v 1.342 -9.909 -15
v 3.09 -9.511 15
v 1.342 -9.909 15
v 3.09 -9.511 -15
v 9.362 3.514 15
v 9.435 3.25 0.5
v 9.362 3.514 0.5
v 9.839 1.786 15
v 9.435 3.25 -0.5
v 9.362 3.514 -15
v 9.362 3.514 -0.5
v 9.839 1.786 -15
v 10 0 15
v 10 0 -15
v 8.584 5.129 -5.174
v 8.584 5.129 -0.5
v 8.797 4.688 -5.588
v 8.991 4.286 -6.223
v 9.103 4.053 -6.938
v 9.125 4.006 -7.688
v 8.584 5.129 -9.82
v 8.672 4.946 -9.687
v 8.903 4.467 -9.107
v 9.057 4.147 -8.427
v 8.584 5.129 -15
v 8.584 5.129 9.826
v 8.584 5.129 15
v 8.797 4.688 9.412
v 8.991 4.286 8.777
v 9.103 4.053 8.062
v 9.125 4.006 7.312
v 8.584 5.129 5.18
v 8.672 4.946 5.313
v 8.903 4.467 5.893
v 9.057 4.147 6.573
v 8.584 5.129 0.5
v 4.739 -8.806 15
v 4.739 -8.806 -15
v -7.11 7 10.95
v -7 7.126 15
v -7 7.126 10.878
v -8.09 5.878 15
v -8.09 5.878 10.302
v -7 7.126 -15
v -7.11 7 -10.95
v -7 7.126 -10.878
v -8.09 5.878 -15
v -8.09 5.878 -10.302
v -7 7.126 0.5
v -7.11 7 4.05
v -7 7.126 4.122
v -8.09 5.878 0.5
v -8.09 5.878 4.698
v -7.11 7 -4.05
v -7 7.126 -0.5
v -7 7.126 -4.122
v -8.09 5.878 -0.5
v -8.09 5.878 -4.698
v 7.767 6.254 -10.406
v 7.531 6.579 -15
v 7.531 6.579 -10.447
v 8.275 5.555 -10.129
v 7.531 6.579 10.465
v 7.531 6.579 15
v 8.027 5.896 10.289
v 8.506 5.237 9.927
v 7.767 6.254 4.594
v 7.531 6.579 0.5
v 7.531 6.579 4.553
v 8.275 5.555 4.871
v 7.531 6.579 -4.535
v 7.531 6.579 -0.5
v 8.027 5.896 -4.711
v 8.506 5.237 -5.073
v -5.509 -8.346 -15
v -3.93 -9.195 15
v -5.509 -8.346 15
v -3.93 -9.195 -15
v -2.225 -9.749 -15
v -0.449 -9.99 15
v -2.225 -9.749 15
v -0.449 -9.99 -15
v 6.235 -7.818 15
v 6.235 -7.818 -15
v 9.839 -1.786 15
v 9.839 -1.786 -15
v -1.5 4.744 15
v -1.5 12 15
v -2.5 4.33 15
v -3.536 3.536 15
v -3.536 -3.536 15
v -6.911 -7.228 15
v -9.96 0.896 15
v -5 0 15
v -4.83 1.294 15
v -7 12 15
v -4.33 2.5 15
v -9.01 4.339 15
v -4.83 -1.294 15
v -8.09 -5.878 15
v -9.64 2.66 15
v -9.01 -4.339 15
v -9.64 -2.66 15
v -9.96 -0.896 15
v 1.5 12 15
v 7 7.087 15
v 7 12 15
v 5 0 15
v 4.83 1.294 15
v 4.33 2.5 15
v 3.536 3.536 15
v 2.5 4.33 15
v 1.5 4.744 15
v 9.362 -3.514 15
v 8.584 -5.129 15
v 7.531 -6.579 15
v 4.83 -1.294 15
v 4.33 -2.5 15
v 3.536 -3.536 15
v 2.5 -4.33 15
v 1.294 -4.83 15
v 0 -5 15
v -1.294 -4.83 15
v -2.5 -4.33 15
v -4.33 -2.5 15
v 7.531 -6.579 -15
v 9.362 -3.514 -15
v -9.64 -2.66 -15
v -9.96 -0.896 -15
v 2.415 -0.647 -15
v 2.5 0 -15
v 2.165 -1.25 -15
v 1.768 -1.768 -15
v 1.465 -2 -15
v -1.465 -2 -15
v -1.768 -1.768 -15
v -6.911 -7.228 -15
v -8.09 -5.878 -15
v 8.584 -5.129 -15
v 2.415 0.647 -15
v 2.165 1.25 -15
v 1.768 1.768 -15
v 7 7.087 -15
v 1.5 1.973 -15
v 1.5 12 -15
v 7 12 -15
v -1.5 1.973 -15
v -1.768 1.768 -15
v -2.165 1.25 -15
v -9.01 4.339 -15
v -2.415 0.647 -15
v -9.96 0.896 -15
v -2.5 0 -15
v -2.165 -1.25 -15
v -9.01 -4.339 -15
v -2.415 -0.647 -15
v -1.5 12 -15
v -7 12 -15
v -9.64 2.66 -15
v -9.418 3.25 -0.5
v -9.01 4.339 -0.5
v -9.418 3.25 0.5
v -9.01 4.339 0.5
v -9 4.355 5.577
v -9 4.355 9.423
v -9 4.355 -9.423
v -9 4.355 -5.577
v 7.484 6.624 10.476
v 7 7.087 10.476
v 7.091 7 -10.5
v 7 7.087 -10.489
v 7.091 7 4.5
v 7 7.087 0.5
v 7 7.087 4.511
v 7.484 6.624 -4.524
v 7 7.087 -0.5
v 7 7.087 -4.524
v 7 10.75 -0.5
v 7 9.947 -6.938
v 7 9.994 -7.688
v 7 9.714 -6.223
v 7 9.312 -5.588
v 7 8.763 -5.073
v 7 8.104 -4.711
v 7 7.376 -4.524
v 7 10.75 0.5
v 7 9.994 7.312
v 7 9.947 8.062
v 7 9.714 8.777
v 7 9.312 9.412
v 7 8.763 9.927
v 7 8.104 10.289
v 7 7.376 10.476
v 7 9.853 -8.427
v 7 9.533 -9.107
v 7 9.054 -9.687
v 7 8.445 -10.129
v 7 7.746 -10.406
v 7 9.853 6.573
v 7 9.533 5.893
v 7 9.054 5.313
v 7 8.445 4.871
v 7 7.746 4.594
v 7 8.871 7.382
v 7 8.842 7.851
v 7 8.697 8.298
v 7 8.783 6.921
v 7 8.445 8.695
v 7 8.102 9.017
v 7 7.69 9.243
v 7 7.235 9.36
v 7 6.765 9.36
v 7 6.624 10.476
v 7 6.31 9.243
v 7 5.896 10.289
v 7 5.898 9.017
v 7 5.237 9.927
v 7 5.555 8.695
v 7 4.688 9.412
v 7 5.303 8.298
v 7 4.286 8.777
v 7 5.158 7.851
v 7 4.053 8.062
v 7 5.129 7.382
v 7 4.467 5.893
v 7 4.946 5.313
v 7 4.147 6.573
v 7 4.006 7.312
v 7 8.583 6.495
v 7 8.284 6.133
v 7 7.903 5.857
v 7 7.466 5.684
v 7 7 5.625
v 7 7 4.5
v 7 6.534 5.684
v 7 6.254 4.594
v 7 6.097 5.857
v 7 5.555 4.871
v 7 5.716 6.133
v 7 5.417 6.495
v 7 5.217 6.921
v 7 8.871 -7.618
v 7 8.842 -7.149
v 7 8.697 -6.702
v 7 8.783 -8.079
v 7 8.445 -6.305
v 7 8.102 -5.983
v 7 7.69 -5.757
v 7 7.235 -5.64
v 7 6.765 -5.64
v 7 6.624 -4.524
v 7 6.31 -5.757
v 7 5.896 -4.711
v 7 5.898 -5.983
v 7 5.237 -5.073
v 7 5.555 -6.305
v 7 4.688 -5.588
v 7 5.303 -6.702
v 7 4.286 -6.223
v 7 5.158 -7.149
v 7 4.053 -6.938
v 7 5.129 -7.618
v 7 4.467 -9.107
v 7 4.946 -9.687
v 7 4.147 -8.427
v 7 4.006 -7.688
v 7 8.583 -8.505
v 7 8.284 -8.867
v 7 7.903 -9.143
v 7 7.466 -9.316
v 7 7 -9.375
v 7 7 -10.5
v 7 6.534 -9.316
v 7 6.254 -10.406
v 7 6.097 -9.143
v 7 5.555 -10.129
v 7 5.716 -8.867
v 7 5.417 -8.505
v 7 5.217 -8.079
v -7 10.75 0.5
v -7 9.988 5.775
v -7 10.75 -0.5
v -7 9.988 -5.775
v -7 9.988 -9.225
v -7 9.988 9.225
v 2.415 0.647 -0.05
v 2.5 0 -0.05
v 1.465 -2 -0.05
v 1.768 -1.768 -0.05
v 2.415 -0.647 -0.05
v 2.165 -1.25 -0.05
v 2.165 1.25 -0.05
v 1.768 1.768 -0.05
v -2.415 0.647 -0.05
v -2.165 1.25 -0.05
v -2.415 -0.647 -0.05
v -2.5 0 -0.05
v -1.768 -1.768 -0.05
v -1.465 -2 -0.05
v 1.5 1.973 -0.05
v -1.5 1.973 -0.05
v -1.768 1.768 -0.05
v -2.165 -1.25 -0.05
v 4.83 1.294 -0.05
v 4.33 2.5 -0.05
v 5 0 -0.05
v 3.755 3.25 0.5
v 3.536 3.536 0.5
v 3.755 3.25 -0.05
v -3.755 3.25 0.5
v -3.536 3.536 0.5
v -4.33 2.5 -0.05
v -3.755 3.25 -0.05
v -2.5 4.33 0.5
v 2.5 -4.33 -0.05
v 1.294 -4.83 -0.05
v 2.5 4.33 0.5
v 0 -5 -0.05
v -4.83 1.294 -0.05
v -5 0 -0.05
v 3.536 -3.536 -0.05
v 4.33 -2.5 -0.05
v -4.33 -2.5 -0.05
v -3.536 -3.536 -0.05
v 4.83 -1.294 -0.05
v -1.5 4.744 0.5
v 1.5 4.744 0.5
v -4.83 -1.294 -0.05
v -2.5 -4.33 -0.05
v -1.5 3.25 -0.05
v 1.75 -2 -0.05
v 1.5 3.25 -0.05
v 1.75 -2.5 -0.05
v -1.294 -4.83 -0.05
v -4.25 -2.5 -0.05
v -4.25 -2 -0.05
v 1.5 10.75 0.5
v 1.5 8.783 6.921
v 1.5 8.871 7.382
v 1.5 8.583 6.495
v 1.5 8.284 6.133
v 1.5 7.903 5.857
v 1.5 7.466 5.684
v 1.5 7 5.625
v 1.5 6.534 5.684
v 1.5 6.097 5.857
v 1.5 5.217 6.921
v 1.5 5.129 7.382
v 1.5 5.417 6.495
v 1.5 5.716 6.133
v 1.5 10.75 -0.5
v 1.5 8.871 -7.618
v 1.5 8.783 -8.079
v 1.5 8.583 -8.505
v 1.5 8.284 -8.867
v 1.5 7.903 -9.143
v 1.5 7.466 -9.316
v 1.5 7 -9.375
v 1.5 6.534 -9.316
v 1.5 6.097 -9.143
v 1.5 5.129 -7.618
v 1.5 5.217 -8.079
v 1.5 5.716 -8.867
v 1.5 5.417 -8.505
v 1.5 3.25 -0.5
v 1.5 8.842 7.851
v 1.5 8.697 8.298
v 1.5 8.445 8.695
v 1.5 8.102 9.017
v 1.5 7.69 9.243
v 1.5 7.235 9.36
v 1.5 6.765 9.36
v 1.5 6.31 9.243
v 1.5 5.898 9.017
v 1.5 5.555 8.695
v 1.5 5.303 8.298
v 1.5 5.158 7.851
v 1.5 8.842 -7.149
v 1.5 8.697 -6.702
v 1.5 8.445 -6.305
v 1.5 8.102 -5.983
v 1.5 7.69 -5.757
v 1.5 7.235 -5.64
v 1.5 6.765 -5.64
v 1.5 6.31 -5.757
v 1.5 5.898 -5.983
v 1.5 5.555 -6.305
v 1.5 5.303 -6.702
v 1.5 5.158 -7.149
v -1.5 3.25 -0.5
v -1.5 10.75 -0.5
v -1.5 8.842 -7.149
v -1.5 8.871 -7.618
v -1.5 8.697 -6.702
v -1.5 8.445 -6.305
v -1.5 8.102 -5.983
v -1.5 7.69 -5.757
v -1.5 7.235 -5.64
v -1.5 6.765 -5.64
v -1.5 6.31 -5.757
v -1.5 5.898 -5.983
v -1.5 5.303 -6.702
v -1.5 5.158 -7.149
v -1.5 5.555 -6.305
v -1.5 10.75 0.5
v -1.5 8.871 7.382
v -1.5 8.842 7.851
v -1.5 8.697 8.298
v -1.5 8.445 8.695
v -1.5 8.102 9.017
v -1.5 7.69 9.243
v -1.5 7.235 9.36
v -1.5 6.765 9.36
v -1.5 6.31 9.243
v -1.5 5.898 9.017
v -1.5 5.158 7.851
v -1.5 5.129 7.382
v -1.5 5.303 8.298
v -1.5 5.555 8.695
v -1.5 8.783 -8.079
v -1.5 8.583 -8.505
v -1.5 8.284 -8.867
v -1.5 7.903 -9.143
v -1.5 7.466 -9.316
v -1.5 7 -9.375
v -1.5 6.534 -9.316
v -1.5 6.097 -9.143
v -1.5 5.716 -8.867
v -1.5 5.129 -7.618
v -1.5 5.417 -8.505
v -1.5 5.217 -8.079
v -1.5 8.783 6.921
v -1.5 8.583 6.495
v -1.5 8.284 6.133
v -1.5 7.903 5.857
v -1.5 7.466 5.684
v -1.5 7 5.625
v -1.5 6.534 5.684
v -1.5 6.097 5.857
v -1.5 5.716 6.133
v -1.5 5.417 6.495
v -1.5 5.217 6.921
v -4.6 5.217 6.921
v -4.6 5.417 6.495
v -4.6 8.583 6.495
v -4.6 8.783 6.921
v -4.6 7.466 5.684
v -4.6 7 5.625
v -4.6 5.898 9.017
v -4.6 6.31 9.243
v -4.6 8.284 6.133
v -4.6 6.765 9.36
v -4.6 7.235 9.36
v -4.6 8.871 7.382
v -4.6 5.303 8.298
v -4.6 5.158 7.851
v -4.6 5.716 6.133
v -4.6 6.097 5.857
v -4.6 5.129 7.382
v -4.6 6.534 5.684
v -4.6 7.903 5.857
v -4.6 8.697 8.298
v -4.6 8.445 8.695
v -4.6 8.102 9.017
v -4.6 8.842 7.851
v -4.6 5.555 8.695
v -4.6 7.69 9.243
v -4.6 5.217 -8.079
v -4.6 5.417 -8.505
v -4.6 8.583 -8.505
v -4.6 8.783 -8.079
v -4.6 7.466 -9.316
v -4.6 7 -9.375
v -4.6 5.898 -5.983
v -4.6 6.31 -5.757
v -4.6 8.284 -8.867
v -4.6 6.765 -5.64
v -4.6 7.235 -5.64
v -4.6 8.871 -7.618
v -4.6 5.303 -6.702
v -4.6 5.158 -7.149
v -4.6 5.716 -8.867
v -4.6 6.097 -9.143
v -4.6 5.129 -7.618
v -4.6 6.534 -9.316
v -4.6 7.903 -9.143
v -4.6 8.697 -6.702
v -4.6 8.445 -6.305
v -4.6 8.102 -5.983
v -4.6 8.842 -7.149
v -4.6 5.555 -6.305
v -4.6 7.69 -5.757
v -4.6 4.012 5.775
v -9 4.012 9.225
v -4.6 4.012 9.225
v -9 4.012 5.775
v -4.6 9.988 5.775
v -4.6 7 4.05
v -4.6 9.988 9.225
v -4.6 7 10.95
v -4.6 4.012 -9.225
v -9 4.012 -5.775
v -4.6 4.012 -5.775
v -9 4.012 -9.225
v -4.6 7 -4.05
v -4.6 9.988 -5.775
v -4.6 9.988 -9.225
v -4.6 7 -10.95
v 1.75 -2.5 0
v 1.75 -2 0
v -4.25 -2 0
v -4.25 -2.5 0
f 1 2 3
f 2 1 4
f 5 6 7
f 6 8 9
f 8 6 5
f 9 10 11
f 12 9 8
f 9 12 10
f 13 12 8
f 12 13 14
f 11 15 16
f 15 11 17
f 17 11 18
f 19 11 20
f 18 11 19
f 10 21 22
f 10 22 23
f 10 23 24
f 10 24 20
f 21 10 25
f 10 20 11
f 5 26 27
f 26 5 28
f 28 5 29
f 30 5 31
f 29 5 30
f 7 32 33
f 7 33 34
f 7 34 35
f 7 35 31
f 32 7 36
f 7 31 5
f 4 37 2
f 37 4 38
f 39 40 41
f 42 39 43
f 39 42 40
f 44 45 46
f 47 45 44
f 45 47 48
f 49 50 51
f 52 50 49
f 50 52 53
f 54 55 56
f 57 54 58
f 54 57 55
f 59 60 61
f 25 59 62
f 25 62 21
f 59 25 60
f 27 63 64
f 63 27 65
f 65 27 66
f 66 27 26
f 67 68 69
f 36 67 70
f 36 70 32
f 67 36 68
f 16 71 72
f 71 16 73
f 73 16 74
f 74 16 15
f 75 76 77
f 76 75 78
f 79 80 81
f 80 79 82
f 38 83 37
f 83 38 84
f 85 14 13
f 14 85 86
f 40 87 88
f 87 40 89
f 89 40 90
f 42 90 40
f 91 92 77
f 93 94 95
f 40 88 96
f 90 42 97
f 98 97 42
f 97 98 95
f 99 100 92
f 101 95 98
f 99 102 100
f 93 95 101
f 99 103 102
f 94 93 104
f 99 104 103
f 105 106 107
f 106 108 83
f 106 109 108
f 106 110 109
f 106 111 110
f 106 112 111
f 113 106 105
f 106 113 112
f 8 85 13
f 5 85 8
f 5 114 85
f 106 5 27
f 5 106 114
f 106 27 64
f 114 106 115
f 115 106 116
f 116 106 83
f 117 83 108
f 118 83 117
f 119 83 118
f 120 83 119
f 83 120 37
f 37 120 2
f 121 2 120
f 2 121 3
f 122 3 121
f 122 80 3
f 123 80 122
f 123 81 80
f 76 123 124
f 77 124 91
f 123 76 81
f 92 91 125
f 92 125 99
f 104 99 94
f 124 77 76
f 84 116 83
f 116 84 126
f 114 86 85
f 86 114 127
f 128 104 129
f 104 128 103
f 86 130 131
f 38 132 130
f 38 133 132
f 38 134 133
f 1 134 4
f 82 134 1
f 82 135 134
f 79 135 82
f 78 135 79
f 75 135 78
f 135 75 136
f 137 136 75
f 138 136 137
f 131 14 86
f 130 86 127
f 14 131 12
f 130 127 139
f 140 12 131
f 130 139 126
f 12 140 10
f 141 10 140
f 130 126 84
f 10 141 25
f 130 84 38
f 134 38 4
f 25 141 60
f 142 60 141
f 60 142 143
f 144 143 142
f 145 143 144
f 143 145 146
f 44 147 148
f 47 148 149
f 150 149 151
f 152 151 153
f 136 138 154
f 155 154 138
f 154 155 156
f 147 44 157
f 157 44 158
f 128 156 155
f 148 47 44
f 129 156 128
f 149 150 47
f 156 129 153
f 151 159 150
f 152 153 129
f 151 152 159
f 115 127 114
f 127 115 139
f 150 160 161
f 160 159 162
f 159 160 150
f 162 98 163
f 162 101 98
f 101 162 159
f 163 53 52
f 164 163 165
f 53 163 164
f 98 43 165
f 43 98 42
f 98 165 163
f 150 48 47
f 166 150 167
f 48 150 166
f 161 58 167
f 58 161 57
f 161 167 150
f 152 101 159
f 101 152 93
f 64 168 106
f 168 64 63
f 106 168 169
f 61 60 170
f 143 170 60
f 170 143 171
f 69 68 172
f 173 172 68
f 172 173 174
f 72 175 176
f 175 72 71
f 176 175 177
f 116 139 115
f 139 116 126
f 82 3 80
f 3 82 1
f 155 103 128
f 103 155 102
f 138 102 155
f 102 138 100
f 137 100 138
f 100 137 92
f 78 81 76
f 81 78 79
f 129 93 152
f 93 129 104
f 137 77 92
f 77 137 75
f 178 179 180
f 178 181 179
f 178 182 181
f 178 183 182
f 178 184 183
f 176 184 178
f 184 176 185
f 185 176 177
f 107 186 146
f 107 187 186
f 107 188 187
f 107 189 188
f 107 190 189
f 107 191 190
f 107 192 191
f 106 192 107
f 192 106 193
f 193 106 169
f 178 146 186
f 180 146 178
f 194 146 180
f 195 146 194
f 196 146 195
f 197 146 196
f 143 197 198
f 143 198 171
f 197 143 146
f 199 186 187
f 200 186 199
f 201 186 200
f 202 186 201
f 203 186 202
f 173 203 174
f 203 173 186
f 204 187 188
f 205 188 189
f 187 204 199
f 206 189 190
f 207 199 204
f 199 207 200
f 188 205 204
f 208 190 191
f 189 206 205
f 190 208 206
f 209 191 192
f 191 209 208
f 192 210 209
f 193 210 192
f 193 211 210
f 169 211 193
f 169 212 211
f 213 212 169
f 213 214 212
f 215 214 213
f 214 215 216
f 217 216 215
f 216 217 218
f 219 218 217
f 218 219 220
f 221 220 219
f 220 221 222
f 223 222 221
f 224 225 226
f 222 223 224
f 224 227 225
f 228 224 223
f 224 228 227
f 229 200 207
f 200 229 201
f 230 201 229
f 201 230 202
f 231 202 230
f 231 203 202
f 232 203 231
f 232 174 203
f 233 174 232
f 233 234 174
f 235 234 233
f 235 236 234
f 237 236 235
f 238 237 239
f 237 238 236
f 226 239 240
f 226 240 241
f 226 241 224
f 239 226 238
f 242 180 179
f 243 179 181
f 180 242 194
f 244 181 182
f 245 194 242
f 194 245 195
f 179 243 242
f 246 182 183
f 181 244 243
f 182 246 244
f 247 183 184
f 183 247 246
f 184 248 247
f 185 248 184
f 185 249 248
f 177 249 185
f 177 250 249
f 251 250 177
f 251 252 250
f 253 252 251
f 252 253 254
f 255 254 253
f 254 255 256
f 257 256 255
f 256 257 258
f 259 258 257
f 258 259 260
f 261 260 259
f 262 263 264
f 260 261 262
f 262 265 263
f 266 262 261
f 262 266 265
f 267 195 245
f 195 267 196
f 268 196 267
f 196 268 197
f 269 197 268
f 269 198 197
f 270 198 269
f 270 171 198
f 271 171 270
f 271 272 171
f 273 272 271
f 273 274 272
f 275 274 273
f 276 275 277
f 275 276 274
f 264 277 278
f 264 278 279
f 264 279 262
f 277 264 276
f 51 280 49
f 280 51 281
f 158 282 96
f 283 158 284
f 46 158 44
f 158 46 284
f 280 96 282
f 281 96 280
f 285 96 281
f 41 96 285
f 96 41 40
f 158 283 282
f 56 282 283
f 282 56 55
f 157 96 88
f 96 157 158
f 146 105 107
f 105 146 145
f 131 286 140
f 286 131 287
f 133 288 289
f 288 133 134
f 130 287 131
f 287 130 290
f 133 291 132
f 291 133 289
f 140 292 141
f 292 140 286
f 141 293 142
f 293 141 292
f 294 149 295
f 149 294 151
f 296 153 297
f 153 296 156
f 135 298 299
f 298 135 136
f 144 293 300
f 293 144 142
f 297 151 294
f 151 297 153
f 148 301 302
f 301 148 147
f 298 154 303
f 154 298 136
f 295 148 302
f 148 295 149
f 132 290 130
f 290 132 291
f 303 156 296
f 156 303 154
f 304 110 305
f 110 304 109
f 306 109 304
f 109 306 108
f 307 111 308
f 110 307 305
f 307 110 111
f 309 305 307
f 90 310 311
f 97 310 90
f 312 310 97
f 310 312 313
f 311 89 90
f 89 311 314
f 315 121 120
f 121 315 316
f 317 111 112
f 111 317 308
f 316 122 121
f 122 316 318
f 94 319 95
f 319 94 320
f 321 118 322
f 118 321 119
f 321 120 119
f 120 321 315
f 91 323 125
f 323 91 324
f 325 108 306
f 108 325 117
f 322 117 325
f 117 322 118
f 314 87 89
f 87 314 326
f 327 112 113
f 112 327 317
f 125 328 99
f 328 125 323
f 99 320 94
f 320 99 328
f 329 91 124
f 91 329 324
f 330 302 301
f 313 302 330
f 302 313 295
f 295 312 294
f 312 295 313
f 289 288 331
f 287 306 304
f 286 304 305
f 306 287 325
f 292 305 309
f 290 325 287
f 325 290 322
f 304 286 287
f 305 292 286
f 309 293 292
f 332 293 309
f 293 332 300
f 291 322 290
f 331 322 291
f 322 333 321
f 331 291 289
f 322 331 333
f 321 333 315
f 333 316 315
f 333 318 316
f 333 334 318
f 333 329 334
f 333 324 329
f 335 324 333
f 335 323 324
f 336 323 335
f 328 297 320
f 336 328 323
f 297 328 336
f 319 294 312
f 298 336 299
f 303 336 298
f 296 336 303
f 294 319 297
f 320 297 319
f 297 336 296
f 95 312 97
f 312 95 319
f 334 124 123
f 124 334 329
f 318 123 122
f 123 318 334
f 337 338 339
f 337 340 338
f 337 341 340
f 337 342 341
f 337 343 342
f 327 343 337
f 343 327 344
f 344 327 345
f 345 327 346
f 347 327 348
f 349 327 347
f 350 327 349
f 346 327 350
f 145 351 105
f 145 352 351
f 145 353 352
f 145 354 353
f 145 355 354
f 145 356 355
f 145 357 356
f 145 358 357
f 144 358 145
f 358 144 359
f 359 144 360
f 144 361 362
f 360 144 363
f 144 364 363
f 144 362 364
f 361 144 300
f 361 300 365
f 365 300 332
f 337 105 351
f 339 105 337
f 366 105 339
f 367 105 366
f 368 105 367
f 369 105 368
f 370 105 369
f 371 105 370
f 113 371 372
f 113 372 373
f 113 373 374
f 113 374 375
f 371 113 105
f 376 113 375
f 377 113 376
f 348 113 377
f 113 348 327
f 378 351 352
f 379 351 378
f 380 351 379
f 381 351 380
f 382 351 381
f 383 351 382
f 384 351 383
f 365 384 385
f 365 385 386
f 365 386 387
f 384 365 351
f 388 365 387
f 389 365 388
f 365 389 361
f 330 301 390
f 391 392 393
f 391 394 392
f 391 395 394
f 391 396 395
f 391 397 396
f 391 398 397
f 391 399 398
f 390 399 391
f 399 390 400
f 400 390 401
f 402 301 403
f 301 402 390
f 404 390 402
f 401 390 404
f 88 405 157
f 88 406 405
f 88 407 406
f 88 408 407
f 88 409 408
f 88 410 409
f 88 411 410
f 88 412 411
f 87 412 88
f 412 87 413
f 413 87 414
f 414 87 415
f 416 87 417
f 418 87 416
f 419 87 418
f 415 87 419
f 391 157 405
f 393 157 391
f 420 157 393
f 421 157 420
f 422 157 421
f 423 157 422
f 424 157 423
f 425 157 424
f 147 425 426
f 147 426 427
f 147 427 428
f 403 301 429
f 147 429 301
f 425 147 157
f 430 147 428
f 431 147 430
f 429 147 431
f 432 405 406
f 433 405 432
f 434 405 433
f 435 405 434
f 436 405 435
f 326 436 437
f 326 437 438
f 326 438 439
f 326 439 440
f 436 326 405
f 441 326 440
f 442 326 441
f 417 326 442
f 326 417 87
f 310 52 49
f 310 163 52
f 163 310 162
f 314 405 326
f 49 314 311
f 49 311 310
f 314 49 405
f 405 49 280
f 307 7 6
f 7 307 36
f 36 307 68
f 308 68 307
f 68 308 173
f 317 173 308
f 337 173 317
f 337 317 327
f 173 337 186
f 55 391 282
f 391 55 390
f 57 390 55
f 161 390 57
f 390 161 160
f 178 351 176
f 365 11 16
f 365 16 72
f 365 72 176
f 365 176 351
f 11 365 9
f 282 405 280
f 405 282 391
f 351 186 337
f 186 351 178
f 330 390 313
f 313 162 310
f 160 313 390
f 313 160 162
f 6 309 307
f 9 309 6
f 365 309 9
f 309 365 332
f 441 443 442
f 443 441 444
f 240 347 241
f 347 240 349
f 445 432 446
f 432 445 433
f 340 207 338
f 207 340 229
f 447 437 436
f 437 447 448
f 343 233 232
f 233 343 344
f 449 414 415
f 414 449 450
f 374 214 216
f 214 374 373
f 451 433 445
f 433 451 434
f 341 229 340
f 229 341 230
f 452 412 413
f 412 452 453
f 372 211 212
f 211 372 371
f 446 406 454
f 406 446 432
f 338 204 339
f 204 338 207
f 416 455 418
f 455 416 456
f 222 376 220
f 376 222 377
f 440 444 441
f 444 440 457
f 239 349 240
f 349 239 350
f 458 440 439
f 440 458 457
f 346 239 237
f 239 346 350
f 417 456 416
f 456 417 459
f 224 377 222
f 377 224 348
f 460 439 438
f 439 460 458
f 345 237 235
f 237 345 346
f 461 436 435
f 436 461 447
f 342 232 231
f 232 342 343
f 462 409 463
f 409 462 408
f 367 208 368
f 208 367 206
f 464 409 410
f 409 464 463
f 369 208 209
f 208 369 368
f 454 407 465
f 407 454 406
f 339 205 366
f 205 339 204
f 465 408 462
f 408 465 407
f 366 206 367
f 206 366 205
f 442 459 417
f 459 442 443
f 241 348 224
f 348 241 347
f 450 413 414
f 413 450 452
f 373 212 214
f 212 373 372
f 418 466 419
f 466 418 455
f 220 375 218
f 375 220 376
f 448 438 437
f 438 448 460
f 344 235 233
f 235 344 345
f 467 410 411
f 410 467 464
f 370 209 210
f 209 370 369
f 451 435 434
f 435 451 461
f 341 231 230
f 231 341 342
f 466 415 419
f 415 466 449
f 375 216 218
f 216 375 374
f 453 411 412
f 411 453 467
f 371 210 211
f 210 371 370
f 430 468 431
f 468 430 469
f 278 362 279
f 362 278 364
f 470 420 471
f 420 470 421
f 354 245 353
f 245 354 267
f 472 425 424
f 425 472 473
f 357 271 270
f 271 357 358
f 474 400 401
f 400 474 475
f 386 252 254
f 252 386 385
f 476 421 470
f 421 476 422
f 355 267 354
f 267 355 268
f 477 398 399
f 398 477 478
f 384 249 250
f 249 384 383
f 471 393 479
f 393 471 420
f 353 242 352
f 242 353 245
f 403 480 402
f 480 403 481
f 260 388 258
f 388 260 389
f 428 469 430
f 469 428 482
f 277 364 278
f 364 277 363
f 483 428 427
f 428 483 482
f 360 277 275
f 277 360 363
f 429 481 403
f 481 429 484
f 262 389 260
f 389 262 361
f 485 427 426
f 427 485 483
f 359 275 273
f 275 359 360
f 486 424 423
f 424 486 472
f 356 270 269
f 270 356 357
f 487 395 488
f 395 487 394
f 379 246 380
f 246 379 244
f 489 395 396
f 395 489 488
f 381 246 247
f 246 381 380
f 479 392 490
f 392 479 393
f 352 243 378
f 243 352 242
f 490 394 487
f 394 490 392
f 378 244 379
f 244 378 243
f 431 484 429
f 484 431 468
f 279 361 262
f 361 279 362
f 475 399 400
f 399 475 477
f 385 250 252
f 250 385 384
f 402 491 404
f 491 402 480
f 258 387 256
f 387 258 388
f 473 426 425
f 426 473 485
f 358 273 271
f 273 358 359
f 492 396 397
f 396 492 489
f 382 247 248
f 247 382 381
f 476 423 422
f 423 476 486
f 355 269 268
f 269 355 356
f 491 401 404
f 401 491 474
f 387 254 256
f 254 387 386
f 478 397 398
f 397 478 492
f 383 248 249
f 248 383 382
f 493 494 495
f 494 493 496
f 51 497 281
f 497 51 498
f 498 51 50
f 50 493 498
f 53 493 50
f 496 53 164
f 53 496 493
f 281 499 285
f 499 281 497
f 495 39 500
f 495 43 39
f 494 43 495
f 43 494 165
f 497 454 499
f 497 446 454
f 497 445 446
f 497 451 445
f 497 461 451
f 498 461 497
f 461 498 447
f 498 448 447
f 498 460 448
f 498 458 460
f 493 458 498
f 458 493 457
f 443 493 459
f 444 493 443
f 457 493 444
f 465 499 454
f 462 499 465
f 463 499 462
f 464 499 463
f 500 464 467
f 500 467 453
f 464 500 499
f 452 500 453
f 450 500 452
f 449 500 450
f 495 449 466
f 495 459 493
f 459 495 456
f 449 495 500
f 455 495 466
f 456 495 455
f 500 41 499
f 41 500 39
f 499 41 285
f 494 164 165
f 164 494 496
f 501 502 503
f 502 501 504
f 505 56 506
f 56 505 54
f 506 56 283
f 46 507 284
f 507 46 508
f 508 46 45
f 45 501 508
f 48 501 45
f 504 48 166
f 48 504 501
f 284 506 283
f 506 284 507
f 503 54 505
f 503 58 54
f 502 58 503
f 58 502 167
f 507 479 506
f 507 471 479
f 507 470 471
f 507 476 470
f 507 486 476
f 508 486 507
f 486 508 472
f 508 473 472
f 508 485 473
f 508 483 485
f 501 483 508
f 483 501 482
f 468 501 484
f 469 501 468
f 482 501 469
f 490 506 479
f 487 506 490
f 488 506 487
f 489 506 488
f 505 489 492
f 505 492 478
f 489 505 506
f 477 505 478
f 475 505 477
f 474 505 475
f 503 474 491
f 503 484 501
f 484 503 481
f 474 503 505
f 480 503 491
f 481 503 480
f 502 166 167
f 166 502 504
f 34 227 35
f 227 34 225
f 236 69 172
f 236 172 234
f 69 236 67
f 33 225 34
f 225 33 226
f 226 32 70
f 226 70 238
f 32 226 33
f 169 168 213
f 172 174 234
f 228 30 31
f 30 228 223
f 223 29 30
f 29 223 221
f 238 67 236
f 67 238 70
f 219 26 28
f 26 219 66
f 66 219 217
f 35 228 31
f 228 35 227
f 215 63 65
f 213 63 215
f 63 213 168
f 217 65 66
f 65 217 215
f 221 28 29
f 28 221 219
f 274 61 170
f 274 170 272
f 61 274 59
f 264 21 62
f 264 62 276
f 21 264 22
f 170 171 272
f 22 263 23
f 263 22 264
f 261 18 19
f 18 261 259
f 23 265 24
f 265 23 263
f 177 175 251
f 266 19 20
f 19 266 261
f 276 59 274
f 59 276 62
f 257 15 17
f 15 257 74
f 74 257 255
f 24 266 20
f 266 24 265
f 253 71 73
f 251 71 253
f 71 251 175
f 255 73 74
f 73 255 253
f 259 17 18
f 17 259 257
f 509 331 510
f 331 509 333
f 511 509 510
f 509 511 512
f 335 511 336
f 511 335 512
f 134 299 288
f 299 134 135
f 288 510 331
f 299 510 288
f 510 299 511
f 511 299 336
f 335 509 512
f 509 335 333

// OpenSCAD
// file: inc/nuts_and_bolts.scad
// Copyright 2010 D1plo1d

// This library is dual licensed under the GPL 3.0 and the GNU Lesser General Public License as per http://creativecommons.org/licenses/LGPL/2.1/ .

//testNutsAndBolts();

module SKIPtestNutsAndBolts()
{
	$fn = 360;
	translate([0,15])nutHole(3);
	boltHole(3, length= 30);
}

MM = "mm";
INCH = "inch"; //Not yet supported

//Based on: http://www.roymech.co.uk/Useful_Tables/Screws/Hex_Screws.htm
METRIC_NUT_AC_WIDTHS =
[
	-1, //0 index is not used but reduces computation
	-1,
	-1,
	6.90,//m3
	8.10,//m4
	9.20,//m5
	11.50,//m6
	-1,
	15.50,//m8
	-1,
	19.60,//m10
	-1,
	22.10,//m12
	-1,
	-1,
	-1,
	27.70,//m16
	-1,
	-1,
	-1,
	34.60,//m20
	-1,
	-1,
	-1,
	41.60,//m24
	-1,
	-1,
	-1,
	-1,
	-1,
	53.1,//m30
	-1,
	-1,
	-1,
	-1,
	-1,
	63.5//m36
];
METRIC_NUT_THICKNESS =
[
	-1, //0 index is not used but reduces computation
	-1,
	-1,
	2.40,//m3
	3.20,//m4
	4.00,//m5
	5.00,//m6
	-1,
	6.50,//m8
	-1,
	8.00,//m10
	-1,
	10.00,//m12
	-1,
	-1,
	-1,
	13.00,//m16
	-1,
	-1,
	-1,
	16.00//m20
	-1,
	-1,
	-1,
	19.00,//m24
	-1,
	-1,
	-1,
	-1,
	-1,
	24.00,//m30
	-1,
	-1,
	-1,
	-1,
	-1,
	29.00//m36
];

COURSE_METRIC_BOLT_MAJOR_THREAD_DIAMETERS =
[//based on max values
	-1, //0 index is not used but reduces computation
	-1,
	-1,
	2.98,//m3
	3.978,//m4
	4.976,//m5
	5.974,//m6
	-1,
	7.972,//m8
	-1,
	9.968,//m10
	-1,
	11.966,//m12
	-1,
	-1,
	-1,
	15.962,//m16
	-1,
	-1,
	-1,
	19.958,//m20
	-1,
	-1,
	-1,
	23.952,//m24
	-1,
	-1,
	-1,
	-1,
	-1,
	29.947,//m30
	-1,
	-1,
	-1,
	-1,
	-1,
	35.940//m36
];

module nutHole(size, units=MM, tolerance = +0.0001, proj = -1)
{
	//takes a metric screw/nut size and looksup nut dimensions
	radius = METRIC_NUT_AC_WIDTHS[size]/2+tolerance;
	height = METRIC_NUT_THICKNESS[size]+tolerance;
	if (proj == -1)
	{
		cylinder(r= radius, h=height, $fn = 6, center=[0,0]);
	}
	if (proj == 1)
	{
		circle(r= radius, $fn = 6);
	}
	if (proj == 2)
	{
		translate([-radius/2, 0])
			square([radius*2, height]);
	}
}

module boltHole(size, units=MM, length, tolerance = +0.0001, proj = -1)
{
	radius = COURSE_METRIC_BOLT_MAJOR_THREAD_DIAMETERS[size]/2+tolerance;
//TODO: proper screw cap values
	capHeight = METRIC_NUT_THICKNESS[size]+tolerance; //METRIC_BOLT_CAP_HEIGHTS[size]+tolerance;
	capRadius = METRIC_NUT_AC_WIDTHS[size]/2+tolerance; //METRIC_BOLT_CAP_RADIUS[size]+tolerance;

	if (proj == -1)
	{
	translate([0, 0, -capHeight])
		cylinder(r= capRadius, h=capHeight, $fn=15);
	cylinder(r = radius, h = length, $fn=15);
	}
	if (proj == 1)
	{
		circle(r = radius);
	}
	if (proj == 2)
	{
		translate([-capRadius/2, -capHeight])
			square([capRadius*2, capHeight]);
		square([radius*2, length]);
	}
}
// main file
use <inc/nuts_and_bolts.scad>;

//%translate([0,0,-15]) import_stl("beefy_coupling.stl");

couplingOD = 20;		//Coupling thickness
couplingH = 30;			//Coupling height
motorShaft = 5;		//Motor shaft
threadShaft = 10;		//Z thread shaft
screwShaft = 3.75;		//Screw shaft
screwHead = 6;		//Screw head
flat = 0.5;

clampWidth = 14;		//Clamp block width
clampBlckOffset = 8.5;	//Offset for clamp block
clampCutV = 3;			//Vertical clamp cut
clampCutH = 1;			//Horizontal clamp cut


union()
{
difference(){
	union(){
		cylinder(r=couplingOD/2, h=couplingH, $fn=35, center=true);
		translate([0,clampBlckOffset,0]) cube([clampWidth, clampWidth/2, couplingH], center=true);
	}
	
	translate([0,0,-couplingH/4]) cylinder(r=motorShaft/2, h=(couplingH/2)+0.1, center=true, $fn=24);
	translate([0,0,couplingH/4]) cylinder(r=threadShaft/2, h=(couplingH/2)+0.1, center=true, $fn=24);
	translate([0,clampBlckOffset,0]) cube([clampCutV, (clampWidth/2)+8, couplingH+1], center=true);
	translate([0,clampBlckOffset-1.5,0]) cube([couplingOD+1,(clampWidth/2)+0.5,clampCutH], center=true);
	translate([0,clampBlckOffset-1.5,couplingH/4]) rotate([0,90,0]) cylinder(r=screwShaft/2, h=couplingOD, center=true, $fn=25);
	translate([0,clampBlckOffset-1.5,-couplingH/4]) rotate([0,90,0]) cylinder(r=screwShaft/2, h=couplingOD, center=true, $fn=25);
	translate([(-clampWidth/2),clampBlckOffset-1.5,couplingH/4]) rotate([0,90,0]) nutHole(3, height =10);
	translate([(-clampWidth/2)-2,clampBlckOffset-1.5,couplingH/4]) rotate([0,90,0]) nutHole(3, height =10);
	translate([(-clampWidth/2),clampBlckOffset-1.5,-couplingH/4]) rotate([0,90,0]) nutHole(3, height =10);
	translate([(-clampWidth/2)-2,clampBlckOffset-1.5,-couplingH/4]) rotate([0,90,0]) nutHole(3, height =10);
	translate([(clampWidth/2)+1.5,clampBlckOffset-1.5,couplingH/4]) rotate([0,90,0]) cylinder(r=screwHead/2, h=3, center=true, $fn=25);
	translate([(clampWidth/2)+1.5,clampBlckOffset-1.5,-couplingH/4]) rotate([0,90,0]) cylinder(r=screwHead/2, h=3, center=true, $fn=25);
/*
translate([0,0,0]) union(){
	for (i=	[[8,0,0],
			[6,0,0],
			[-8,0,0],
			[-6,0,0],
			[-5.75,-5.75,0],
			[-4.5,-4.5,0],
			[5.75,5.75,0],
			[4.5,4.5,0],
			[-5.75,5.75,0],
			[-4.5,4.5,0],
			[5.75,-5.75,0],
			[4.5,-4.5,0],
			[-3,-7.25,0],
			[-2.3,-5.75,0],
			[3,-7.25,0],
			[2.3,-5.75,0],
			[-7.5,3,0],
			[-5.5,2.25,0],	
			[-7.5,-3,0],
			[-5.5,-2.25,0],
			[7.5,3,0],
			[5.5,2.25,0],
			[7.5,-3,0],
			[5.5,-2.25,0],	
			[0,-7.75,0],
			[0,-6,0]]){
	translate(i) cylinder(r=0.2, h=couplingH+1, center=true);
}}*/
}


translate([-motorShaft/4,-motorShaft/2+flat/2,-couplingH/4]) cube([motorShaft+1,flat,couplingH/2], center=true);
}
